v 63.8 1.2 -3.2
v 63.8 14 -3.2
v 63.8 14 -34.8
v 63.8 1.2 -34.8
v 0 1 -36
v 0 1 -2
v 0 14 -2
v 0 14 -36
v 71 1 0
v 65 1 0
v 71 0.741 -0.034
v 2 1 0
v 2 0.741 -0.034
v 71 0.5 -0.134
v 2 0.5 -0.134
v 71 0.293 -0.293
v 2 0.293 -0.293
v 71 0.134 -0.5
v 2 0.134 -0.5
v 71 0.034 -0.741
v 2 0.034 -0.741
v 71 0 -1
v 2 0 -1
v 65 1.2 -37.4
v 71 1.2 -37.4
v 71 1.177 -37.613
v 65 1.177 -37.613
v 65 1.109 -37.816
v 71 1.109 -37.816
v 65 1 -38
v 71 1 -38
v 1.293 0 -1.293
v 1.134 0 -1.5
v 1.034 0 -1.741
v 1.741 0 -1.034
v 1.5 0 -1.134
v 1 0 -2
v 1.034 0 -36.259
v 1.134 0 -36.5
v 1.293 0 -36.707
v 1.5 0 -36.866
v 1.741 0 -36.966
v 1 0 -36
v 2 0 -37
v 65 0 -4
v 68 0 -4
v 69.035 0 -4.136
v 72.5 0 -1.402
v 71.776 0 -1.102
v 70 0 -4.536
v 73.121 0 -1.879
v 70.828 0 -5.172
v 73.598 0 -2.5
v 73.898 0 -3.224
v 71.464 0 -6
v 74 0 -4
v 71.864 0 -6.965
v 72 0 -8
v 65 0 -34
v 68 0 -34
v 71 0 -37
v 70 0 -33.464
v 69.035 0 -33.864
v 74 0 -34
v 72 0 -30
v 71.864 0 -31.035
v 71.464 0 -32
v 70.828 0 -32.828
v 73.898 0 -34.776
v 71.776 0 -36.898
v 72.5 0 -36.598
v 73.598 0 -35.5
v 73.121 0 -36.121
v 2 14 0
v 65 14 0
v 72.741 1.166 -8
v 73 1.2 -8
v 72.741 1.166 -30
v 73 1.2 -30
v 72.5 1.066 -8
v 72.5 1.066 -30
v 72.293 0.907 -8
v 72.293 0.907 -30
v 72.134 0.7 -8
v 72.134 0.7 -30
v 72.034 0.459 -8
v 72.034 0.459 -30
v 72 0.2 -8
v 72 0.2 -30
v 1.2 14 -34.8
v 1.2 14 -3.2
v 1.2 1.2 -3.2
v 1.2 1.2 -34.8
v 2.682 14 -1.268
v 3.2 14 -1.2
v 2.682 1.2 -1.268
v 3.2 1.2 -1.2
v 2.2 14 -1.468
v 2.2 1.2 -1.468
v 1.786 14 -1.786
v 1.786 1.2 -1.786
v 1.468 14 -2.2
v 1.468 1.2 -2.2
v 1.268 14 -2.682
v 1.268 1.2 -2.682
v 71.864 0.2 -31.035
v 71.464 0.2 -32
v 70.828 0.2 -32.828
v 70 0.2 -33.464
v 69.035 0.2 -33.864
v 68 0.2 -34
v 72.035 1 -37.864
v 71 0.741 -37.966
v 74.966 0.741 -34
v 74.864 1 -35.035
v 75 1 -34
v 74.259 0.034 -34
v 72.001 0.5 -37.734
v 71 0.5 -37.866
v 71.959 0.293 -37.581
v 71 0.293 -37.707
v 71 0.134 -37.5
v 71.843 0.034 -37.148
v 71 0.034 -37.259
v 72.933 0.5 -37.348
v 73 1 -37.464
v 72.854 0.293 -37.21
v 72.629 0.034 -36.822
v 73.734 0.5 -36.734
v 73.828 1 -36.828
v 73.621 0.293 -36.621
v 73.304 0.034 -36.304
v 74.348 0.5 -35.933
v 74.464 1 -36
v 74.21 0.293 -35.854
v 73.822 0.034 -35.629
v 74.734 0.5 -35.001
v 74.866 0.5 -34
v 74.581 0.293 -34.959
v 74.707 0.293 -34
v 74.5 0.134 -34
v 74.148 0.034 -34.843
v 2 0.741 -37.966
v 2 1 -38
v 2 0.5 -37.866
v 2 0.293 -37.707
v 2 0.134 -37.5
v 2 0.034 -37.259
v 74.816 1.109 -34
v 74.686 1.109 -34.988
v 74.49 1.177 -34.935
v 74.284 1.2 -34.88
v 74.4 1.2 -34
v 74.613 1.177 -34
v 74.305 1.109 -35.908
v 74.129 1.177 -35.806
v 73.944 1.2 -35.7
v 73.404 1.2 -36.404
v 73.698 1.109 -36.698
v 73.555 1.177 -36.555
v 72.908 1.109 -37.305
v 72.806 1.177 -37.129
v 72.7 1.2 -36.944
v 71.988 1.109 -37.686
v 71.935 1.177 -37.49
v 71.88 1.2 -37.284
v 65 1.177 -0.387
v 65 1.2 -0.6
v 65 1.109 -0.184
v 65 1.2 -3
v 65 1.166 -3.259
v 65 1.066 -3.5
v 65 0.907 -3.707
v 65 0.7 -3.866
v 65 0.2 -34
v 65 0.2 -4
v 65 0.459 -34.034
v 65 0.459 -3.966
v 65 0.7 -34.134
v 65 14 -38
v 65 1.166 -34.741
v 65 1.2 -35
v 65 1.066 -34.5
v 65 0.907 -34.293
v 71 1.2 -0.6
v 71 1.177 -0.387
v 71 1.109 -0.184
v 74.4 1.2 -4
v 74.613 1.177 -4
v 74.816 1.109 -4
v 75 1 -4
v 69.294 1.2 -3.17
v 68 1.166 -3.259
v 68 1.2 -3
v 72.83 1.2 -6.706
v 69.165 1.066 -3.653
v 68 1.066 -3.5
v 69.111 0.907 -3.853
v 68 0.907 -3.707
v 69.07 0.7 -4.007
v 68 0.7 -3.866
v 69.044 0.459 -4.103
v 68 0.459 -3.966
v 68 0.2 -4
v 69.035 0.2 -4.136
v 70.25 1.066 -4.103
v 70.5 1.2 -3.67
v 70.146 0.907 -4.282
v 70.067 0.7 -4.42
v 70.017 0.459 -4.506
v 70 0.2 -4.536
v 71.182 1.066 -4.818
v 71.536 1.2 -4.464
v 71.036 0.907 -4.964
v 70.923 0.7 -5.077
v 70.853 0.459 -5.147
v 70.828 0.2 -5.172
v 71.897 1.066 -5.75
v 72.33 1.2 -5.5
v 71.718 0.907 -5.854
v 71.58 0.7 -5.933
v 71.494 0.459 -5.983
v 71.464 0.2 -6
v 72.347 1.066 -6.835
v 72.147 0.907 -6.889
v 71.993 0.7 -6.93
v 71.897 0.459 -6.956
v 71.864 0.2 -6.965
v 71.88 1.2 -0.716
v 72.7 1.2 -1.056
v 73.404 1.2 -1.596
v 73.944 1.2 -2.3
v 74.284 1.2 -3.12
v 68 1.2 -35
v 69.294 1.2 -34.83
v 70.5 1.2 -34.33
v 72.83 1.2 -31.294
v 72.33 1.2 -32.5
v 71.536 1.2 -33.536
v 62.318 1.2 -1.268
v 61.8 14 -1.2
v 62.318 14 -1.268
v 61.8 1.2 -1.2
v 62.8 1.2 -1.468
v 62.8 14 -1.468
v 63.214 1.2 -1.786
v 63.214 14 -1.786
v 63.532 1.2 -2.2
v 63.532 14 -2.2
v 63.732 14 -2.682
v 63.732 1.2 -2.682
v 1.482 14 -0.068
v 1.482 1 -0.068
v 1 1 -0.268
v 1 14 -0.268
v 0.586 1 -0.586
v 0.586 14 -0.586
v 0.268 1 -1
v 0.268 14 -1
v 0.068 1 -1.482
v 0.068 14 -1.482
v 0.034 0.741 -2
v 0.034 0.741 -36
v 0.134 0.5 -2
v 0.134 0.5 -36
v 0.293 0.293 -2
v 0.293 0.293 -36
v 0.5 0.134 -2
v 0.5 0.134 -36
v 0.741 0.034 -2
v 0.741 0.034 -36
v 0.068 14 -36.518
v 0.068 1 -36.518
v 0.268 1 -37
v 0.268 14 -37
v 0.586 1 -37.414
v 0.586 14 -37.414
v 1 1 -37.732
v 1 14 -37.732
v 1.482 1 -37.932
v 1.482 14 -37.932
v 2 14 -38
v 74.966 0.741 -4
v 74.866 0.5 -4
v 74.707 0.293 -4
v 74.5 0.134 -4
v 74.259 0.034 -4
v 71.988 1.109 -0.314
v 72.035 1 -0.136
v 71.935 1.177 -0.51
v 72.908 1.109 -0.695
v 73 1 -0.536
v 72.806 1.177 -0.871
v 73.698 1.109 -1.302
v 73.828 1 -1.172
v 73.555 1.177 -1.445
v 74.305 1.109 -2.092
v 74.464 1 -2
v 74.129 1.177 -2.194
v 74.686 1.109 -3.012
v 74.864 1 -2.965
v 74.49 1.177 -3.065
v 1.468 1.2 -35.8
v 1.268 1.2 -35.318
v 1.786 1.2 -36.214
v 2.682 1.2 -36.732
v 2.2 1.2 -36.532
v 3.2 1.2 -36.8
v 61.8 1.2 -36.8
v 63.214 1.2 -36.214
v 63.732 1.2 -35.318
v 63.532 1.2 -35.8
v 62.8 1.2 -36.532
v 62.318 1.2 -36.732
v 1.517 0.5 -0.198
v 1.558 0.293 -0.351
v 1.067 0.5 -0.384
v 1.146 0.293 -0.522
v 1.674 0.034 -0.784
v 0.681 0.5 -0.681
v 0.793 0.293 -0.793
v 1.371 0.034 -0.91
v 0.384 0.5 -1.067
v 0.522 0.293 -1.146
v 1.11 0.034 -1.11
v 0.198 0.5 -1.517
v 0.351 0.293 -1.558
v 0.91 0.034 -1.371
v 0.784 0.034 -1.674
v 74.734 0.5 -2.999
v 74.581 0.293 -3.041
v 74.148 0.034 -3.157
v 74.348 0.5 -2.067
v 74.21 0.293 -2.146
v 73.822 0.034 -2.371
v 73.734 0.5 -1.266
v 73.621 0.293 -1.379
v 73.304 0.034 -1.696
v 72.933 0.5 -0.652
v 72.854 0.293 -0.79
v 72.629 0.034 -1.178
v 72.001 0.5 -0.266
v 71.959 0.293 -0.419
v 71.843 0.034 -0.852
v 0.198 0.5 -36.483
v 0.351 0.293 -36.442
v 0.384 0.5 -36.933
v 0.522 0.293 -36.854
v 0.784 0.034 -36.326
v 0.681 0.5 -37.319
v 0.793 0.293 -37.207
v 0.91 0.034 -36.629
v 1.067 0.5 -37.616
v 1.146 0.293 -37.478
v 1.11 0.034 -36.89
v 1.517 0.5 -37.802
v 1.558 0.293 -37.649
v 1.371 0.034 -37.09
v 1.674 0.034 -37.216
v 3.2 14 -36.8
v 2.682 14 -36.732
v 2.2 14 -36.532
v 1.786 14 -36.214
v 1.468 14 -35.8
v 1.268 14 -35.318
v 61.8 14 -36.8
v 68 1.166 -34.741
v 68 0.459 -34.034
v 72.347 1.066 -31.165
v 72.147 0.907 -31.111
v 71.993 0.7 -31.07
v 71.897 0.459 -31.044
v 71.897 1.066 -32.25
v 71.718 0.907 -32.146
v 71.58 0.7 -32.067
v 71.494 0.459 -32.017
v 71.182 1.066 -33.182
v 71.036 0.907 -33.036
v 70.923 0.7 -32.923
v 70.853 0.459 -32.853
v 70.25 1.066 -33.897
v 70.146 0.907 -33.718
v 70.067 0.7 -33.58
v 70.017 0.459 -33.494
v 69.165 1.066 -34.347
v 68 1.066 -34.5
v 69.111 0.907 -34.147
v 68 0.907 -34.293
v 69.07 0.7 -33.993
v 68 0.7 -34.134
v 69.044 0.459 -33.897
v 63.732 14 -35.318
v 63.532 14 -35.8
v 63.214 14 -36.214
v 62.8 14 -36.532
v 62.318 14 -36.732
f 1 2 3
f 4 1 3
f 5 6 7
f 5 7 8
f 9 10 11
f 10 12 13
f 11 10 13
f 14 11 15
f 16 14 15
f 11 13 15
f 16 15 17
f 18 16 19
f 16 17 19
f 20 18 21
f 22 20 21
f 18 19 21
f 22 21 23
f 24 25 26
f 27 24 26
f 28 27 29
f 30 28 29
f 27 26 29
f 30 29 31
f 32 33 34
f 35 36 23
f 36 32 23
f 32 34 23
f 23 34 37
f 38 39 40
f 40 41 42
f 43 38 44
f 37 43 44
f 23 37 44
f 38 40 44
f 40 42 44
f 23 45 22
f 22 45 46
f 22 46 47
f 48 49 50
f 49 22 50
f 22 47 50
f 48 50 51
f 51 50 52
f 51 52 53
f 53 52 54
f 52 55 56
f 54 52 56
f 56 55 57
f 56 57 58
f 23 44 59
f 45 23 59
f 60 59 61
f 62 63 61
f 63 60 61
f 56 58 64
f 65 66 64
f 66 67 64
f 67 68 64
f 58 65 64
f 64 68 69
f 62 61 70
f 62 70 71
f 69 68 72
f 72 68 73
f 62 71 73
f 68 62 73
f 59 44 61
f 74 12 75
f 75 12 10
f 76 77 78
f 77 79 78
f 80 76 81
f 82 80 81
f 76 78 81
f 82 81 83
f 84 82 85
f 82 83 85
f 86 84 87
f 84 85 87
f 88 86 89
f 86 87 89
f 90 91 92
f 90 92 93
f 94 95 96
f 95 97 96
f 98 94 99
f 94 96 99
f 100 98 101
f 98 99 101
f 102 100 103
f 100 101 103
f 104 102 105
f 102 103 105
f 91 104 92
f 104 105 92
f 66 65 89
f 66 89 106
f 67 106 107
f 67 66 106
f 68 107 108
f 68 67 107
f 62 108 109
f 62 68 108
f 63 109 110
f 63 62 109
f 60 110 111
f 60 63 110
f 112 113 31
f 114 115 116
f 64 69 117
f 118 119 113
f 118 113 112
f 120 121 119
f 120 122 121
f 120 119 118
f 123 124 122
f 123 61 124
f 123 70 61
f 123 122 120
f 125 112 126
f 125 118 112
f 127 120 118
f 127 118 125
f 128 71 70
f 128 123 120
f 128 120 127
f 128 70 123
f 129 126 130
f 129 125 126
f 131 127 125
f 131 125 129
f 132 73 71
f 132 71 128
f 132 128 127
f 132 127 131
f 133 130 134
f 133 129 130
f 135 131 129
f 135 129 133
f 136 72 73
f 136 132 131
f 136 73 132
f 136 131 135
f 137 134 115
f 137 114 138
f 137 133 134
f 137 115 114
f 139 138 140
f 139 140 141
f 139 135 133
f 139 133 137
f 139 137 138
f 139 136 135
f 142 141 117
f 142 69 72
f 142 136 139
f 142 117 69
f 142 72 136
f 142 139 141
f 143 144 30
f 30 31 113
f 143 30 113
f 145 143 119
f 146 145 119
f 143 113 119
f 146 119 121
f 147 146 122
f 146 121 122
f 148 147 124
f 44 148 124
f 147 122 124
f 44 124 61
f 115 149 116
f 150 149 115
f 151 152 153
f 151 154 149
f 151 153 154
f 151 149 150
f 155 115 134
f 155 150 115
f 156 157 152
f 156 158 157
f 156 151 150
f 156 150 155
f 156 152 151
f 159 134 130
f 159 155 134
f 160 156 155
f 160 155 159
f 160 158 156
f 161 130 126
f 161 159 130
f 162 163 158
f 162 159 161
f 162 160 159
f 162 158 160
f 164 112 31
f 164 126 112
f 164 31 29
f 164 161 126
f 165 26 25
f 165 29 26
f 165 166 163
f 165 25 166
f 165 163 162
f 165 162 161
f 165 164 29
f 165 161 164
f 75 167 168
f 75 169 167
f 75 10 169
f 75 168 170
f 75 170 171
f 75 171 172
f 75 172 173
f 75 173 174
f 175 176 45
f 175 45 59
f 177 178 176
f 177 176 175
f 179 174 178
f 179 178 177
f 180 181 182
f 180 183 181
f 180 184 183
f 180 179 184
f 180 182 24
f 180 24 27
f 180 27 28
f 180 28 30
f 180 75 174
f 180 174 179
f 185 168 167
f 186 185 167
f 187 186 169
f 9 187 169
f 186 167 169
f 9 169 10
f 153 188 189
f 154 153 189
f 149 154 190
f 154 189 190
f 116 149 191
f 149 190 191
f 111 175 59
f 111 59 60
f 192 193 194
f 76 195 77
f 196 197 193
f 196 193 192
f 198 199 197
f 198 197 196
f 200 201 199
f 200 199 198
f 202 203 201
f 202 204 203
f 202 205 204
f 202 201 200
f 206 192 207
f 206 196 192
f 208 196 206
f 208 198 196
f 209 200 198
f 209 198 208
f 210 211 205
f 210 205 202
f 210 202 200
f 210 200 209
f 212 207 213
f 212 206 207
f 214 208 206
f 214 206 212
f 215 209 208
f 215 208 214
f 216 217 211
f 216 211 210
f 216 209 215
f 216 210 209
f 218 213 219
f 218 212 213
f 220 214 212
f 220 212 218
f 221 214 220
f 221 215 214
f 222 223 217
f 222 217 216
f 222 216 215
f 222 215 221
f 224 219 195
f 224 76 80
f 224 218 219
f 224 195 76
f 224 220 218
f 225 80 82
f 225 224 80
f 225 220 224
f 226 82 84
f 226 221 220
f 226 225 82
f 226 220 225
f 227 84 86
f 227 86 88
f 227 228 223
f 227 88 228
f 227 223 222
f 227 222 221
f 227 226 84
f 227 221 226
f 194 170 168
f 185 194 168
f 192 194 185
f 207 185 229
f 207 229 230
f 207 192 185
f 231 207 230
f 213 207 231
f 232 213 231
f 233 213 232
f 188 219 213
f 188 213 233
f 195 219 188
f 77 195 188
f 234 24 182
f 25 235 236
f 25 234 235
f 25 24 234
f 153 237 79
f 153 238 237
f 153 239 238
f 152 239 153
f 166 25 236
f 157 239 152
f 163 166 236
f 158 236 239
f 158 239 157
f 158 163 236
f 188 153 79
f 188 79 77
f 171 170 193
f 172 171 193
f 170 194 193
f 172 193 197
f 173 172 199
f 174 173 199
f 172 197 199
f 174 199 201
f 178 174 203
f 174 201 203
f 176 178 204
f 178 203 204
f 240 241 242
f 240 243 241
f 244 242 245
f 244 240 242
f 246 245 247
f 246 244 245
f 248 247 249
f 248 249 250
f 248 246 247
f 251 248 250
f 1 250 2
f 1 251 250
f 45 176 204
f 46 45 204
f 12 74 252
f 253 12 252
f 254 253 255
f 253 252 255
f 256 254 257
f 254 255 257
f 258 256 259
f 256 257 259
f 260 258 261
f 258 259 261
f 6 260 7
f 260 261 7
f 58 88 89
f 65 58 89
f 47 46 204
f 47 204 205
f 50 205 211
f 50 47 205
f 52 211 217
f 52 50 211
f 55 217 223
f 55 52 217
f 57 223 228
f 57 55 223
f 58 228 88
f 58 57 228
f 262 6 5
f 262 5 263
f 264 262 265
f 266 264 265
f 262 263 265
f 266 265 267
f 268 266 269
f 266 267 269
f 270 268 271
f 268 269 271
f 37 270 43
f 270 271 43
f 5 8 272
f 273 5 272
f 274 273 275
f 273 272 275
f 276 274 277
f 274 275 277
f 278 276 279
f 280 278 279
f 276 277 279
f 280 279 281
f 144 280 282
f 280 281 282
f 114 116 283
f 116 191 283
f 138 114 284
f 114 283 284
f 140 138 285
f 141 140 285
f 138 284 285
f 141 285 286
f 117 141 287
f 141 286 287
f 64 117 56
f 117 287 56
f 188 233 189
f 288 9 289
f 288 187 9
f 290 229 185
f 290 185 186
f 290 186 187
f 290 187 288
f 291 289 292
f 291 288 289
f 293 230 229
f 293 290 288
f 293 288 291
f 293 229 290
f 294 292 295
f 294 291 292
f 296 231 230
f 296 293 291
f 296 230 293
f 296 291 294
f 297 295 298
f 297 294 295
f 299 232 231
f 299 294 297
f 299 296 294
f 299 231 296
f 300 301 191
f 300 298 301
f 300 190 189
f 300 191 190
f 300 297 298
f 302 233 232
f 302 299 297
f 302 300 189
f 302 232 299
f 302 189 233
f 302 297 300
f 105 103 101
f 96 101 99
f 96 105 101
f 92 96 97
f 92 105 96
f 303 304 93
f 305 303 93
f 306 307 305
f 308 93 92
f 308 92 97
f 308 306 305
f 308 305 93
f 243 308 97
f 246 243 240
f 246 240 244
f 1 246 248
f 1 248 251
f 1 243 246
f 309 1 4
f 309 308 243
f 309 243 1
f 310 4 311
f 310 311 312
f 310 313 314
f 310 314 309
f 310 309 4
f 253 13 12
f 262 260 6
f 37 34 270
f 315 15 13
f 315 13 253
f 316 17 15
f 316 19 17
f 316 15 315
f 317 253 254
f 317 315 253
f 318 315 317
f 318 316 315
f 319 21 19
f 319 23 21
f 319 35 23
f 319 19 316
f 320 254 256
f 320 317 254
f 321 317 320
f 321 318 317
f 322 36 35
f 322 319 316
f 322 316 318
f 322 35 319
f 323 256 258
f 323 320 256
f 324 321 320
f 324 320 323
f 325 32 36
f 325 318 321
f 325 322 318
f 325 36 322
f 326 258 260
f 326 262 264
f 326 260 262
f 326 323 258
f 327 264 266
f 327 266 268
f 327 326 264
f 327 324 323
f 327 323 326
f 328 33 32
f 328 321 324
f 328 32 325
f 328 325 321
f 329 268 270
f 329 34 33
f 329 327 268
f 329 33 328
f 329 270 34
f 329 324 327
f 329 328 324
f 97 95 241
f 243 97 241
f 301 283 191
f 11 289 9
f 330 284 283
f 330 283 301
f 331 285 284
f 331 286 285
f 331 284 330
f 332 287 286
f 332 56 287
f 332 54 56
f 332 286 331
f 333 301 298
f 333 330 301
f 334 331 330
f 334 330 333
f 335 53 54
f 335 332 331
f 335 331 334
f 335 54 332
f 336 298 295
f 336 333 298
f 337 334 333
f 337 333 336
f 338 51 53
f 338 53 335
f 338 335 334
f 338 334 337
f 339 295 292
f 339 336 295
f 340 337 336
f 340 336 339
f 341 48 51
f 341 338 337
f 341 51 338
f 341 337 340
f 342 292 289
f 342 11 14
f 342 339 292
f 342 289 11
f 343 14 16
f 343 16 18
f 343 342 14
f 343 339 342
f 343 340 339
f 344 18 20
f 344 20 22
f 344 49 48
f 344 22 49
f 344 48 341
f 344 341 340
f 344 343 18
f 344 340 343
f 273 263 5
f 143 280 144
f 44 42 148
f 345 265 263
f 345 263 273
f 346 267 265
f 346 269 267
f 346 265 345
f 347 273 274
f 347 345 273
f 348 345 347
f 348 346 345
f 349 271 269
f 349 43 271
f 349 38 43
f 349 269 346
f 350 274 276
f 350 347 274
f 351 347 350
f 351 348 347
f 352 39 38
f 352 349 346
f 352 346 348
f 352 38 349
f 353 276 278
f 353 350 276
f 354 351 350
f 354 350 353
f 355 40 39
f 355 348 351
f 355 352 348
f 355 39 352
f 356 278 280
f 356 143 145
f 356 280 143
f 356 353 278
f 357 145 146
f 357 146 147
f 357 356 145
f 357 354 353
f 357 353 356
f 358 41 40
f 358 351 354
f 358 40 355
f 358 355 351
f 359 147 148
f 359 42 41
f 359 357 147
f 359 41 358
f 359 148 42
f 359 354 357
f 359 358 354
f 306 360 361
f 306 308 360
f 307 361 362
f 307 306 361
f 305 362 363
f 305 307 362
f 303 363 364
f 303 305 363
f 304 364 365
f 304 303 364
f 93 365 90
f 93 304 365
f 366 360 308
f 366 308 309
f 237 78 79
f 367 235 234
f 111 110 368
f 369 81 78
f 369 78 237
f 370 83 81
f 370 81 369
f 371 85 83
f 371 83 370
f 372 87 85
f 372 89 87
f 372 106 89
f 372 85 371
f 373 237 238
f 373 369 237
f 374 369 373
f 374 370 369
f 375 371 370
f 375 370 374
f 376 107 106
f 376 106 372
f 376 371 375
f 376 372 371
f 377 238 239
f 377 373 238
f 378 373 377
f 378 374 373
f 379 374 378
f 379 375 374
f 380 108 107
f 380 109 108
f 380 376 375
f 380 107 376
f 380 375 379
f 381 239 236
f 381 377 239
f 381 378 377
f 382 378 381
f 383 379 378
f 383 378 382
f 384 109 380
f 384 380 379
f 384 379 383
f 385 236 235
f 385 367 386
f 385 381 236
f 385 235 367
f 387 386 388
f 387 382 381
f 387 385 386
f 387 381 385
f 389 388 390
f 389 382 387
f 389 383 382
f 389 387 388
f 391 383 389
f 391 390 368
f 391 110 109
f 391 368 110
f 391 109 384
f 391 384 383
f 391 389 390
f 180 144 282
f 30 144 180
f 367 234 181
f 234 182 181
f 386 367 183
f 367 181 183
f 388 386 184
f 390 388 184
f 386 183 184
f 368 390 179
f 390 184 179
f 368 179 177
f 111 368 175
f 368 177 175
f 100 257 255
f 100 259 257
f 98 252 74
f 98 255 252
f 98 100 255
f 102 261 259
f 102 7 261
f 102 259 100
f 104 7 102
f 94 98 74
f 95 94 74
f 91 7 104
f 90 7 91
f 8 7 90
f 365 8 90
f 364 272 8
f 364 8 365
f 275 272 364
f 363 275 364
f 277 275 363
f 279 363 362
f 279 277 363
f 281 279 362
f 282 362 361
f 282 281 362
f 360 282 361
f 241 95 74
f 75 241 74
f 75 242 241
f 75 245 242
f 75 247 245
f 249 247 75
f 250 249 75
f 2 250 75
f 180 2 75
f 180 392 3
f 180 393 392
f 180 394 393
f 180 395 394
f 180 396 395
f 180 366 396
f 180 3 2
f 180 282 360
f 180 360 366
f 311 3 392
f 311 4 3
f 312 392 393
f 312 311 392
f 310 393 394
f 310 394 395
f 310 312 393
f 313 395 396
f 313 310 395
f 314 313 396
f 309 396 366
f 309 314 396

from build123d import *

# Parameters (mm, degrees)
SKETCH_1_W          = 75
SKETCH_1_H          = 38
EXTRUDE_1_DEPTH     = 14
SKETCH_2_W          = 10
SKETCH_2_H          = 38
CUT_EXTRUDE_1_DEPTH = 12.8
SKETCH_3_W          = 7
SKETCH_3_H          = 30
CUT_EXTRUDE_2_DEPTH = 1.2
FILLET_2_R          = 4
SKETCH_5_W          = 62.6
SKETCH_5_H          = 35.6
CUT_EXTRUDE_4_DEPTH = 12.8
FILLET_3_R          = 2
FILLET_4_R          = 2
FILLET_6_R          = 1
FILLET_7_R          = 1
FILLET_8_R          = 1


with BuildPart() as part:
    # Эскиз1 → Бобышка-Вытянуть1 (new body)
    with BuildSketch(Plane(origin=(0, 0, 0), x_dir=(1, 0, 0), z_dir=(0, 1, 0))):
        with Locations((37.5, 19)):
            Rectangle(SKETCH_1_W, SKETCH_1_H)
    extrude(amount=EXTRUDE_1_DEPTH)

    # Эскиз2 → Вырез-Вытянуть1 (cut)
    with BuildSketch(Plane(origin=(0, 14, 0), x_dir=(1, 0, 0), z_dir=(0, 1, 0))):
        with Locations((70, 19)):
            Rectangle(SKETCH_2_W, SKETCH_2_H)
    extrude(amount=-CUT_EXTRUDE_1_DEPTH, mode=Mode.SUBTRACT)

    # Эскиз3 → Вырез-Вытянуть2 (cut)
    with BuildSketch(Plane(origin=(0, 1.2, 0), x_dir=(1, 0, 0), z_dir=(0, 1, 0))):
        with Locations((68.5, 19)):
            Rectangle(SKETCH_3_W, SKETCH_3_H)
    extrude(amount=-CUT_EXTRUDE_2_DEPTH, mode=Mode.SUBTRACT)

    # Скругление2
    fillet_2_edges = [part.edges().sort_by_distance(p)[0] for p in [
        (75, 0.6, -38),
        (75, 0.6, 0),
        (72, 0.6, -34),
        (72, 0.6, -4),
    ]]
    fillet(fillet_2_edges, radius=FILLET_2_R)

    # Эскиз5 → Вырез-Вытянуть4 (cut)
    with BuildSketch(Plane(origin=(0, 14, 0), x_dir=(1, 0, 0), z_dir=(0, 1, 0))):
        with Locations((32.5, 19)):
            Rectangle(SKETCH_5_W, SKETCH_5_H)
    extrude(amount=-CUT_EXTRUDE_4_DEPTH, mode=Mode.SUBTRACT)

    # Скругление3
    fillet_3_edges = [part.edges().sort_by_distance(p)[0] for p in [
        (0, 7, -38),
        (0, 7, 0),
    ]]
    fillet(fillet_3_edges, radius=FILLET_3_R)

    # Скругление4
    fillet_4_edges = [part.edges().sort_by_distance(p)[0] for p in [
        (1.2, 7.6, -1.2),
        (1.2, 7.6, -36.8),
        (63.8, 7.6, -36.8),
        (63.8, 7.6, -1.2),
    ]]
    fillet(fillet_4_edges, radius=FILLET_4_R)

    # Скругление6
    fillet_6_edges = [part.edges().sort_by_distance(p)[0] for p in [
        (36.5, 0, -38),
        (75, 0, -19),
        (73.828427125, 0, -1.171572875),
        (73.828427125, 0, -36.828427125),
        (0, 0, -19),
        (36.5, 0, 0),
        (0.585786438, 0, -0.585786438),
        (0.585786438, 0, -37.414213562),
    ]]
    fillet(fillet_6_edges, radius=FILLET_6_R)

    # Скругление7
    fillet_7_edges = [part.edges().sort_by_distance(p)[0] for p in [
        (66.5, 1.2, -4),
        (72, 1.2, -19),
        (66.5, 1.2, -34),
        (70.828427125, 1.2, -5.171572875),
        (70.828427125, 1.2, -32.828427125),
    ]]
    fillet(fillet_7_edges, radius=FILLET_7_R)

    # Скругление8
    # the kernel refuses this fillet: 1 mm, written as the material it takes off along each edge
    with BuildSketch(Plane(origin=(71, 1.2, -38), x_dir=(0, 0, 1), z_dir=(-1, 0, 0)), Plane(origin=(65, 1.2, 0), x_dir=(0, 0, -1), z_dir=(1, 0, 0))) as fillet_8_piece_1:
        with BuildLine():
            CenterArc((0.6, -1), FILLET_8_R, 90, 36.869897646)
            Line((0, -0.2), (-0.012, -0.184))
            ThreePointArc((-0.012, -0.184), (-0.02, -0.1), (-0.02, 0))
            Line((-0.02, 0), (0, 0.02))
            Line((0, 0.02), (0.6, 0.02))
            Line((0.6, 0.02), (0.6, 0))
        make_face()
    extrude(amount=6, mode=Mode.SUBTRACT)
    with BuildSketch(Plane(origin=(71, 1.2, -34), x_dir=(1, 0, 0), z_dir=(0, 0, 1))) as fillet_8_piece_2:
        with BuildLine():
            CenterArc((3.4, -1), FILLET_8_R, 53.130102354, 36.869897646)
            Line((4, -0.2), (4.012, -0.184))
            ThreePointArc((4.012, -0.184), (4.02, -0.1), (4.02, 0))
            Line((4.02, 0), (4, 0.02))
            Line((4, 0.02), (3.4, 0.02))
            Line((3.4, 0.02), (3.4, 0))
        make_face()
    revolve(axis=Axis((71, 1.2, -34), (0, 1, 0)), revolution_arc=90, mode=Mode.SUBTRACT)
    with BuildSketch(Plane(origin=(75, 1.2, -4), x_dir=(-1, 0, 0), z_dir=(0, 0, -1))) as fillet_8_piece_3:
        with BuildLine():
            CenterArc((0.6, -1), FILLET_8_R, 90, 36.869897646)
            Line((0, -0.2), (-0.012, -0.184))
            ThreePointArc((-0.012, -0.184), (-0.02, -0.1), (-0.02, 0))
            Line((-0.02, 0), (0, 0.02))
            Line((0, 0.02), (0.6, 0.02))
            Line((0.6, 0.02), (0.6, 0))
        make_face()
    extrude(amount=30, mode=Mode.SUBTRACT)
    with BuildSketch(Plane(origin=(71, 1.2, -4), x_dir=(0, 0, 1), z_dir=(-1, 0, 0))) as fillet_8_piece_4:
        with BuildLine():
            CenterArc((3.4, -1), FILLET_8_R, 53.130102354, 36.869897646)
            Line((4, -0.2), (4.012, -0.184))
            ThreePointArc((4.012, -0.184), (4.02, -0.1), (4.02, 0))
            Line((4.02, 0), (4, 0.02))
            Line((4, 0.02), (3.4, 0.02))
            Line((3.4, 0.02), (3.4, 0))
        make_face()
    revolve(axis=Axis((71, 1.2, -4), (0, 1, 0)), revolution_arc=90, mode=Mode.SUBTRACT)


solid = part.part
